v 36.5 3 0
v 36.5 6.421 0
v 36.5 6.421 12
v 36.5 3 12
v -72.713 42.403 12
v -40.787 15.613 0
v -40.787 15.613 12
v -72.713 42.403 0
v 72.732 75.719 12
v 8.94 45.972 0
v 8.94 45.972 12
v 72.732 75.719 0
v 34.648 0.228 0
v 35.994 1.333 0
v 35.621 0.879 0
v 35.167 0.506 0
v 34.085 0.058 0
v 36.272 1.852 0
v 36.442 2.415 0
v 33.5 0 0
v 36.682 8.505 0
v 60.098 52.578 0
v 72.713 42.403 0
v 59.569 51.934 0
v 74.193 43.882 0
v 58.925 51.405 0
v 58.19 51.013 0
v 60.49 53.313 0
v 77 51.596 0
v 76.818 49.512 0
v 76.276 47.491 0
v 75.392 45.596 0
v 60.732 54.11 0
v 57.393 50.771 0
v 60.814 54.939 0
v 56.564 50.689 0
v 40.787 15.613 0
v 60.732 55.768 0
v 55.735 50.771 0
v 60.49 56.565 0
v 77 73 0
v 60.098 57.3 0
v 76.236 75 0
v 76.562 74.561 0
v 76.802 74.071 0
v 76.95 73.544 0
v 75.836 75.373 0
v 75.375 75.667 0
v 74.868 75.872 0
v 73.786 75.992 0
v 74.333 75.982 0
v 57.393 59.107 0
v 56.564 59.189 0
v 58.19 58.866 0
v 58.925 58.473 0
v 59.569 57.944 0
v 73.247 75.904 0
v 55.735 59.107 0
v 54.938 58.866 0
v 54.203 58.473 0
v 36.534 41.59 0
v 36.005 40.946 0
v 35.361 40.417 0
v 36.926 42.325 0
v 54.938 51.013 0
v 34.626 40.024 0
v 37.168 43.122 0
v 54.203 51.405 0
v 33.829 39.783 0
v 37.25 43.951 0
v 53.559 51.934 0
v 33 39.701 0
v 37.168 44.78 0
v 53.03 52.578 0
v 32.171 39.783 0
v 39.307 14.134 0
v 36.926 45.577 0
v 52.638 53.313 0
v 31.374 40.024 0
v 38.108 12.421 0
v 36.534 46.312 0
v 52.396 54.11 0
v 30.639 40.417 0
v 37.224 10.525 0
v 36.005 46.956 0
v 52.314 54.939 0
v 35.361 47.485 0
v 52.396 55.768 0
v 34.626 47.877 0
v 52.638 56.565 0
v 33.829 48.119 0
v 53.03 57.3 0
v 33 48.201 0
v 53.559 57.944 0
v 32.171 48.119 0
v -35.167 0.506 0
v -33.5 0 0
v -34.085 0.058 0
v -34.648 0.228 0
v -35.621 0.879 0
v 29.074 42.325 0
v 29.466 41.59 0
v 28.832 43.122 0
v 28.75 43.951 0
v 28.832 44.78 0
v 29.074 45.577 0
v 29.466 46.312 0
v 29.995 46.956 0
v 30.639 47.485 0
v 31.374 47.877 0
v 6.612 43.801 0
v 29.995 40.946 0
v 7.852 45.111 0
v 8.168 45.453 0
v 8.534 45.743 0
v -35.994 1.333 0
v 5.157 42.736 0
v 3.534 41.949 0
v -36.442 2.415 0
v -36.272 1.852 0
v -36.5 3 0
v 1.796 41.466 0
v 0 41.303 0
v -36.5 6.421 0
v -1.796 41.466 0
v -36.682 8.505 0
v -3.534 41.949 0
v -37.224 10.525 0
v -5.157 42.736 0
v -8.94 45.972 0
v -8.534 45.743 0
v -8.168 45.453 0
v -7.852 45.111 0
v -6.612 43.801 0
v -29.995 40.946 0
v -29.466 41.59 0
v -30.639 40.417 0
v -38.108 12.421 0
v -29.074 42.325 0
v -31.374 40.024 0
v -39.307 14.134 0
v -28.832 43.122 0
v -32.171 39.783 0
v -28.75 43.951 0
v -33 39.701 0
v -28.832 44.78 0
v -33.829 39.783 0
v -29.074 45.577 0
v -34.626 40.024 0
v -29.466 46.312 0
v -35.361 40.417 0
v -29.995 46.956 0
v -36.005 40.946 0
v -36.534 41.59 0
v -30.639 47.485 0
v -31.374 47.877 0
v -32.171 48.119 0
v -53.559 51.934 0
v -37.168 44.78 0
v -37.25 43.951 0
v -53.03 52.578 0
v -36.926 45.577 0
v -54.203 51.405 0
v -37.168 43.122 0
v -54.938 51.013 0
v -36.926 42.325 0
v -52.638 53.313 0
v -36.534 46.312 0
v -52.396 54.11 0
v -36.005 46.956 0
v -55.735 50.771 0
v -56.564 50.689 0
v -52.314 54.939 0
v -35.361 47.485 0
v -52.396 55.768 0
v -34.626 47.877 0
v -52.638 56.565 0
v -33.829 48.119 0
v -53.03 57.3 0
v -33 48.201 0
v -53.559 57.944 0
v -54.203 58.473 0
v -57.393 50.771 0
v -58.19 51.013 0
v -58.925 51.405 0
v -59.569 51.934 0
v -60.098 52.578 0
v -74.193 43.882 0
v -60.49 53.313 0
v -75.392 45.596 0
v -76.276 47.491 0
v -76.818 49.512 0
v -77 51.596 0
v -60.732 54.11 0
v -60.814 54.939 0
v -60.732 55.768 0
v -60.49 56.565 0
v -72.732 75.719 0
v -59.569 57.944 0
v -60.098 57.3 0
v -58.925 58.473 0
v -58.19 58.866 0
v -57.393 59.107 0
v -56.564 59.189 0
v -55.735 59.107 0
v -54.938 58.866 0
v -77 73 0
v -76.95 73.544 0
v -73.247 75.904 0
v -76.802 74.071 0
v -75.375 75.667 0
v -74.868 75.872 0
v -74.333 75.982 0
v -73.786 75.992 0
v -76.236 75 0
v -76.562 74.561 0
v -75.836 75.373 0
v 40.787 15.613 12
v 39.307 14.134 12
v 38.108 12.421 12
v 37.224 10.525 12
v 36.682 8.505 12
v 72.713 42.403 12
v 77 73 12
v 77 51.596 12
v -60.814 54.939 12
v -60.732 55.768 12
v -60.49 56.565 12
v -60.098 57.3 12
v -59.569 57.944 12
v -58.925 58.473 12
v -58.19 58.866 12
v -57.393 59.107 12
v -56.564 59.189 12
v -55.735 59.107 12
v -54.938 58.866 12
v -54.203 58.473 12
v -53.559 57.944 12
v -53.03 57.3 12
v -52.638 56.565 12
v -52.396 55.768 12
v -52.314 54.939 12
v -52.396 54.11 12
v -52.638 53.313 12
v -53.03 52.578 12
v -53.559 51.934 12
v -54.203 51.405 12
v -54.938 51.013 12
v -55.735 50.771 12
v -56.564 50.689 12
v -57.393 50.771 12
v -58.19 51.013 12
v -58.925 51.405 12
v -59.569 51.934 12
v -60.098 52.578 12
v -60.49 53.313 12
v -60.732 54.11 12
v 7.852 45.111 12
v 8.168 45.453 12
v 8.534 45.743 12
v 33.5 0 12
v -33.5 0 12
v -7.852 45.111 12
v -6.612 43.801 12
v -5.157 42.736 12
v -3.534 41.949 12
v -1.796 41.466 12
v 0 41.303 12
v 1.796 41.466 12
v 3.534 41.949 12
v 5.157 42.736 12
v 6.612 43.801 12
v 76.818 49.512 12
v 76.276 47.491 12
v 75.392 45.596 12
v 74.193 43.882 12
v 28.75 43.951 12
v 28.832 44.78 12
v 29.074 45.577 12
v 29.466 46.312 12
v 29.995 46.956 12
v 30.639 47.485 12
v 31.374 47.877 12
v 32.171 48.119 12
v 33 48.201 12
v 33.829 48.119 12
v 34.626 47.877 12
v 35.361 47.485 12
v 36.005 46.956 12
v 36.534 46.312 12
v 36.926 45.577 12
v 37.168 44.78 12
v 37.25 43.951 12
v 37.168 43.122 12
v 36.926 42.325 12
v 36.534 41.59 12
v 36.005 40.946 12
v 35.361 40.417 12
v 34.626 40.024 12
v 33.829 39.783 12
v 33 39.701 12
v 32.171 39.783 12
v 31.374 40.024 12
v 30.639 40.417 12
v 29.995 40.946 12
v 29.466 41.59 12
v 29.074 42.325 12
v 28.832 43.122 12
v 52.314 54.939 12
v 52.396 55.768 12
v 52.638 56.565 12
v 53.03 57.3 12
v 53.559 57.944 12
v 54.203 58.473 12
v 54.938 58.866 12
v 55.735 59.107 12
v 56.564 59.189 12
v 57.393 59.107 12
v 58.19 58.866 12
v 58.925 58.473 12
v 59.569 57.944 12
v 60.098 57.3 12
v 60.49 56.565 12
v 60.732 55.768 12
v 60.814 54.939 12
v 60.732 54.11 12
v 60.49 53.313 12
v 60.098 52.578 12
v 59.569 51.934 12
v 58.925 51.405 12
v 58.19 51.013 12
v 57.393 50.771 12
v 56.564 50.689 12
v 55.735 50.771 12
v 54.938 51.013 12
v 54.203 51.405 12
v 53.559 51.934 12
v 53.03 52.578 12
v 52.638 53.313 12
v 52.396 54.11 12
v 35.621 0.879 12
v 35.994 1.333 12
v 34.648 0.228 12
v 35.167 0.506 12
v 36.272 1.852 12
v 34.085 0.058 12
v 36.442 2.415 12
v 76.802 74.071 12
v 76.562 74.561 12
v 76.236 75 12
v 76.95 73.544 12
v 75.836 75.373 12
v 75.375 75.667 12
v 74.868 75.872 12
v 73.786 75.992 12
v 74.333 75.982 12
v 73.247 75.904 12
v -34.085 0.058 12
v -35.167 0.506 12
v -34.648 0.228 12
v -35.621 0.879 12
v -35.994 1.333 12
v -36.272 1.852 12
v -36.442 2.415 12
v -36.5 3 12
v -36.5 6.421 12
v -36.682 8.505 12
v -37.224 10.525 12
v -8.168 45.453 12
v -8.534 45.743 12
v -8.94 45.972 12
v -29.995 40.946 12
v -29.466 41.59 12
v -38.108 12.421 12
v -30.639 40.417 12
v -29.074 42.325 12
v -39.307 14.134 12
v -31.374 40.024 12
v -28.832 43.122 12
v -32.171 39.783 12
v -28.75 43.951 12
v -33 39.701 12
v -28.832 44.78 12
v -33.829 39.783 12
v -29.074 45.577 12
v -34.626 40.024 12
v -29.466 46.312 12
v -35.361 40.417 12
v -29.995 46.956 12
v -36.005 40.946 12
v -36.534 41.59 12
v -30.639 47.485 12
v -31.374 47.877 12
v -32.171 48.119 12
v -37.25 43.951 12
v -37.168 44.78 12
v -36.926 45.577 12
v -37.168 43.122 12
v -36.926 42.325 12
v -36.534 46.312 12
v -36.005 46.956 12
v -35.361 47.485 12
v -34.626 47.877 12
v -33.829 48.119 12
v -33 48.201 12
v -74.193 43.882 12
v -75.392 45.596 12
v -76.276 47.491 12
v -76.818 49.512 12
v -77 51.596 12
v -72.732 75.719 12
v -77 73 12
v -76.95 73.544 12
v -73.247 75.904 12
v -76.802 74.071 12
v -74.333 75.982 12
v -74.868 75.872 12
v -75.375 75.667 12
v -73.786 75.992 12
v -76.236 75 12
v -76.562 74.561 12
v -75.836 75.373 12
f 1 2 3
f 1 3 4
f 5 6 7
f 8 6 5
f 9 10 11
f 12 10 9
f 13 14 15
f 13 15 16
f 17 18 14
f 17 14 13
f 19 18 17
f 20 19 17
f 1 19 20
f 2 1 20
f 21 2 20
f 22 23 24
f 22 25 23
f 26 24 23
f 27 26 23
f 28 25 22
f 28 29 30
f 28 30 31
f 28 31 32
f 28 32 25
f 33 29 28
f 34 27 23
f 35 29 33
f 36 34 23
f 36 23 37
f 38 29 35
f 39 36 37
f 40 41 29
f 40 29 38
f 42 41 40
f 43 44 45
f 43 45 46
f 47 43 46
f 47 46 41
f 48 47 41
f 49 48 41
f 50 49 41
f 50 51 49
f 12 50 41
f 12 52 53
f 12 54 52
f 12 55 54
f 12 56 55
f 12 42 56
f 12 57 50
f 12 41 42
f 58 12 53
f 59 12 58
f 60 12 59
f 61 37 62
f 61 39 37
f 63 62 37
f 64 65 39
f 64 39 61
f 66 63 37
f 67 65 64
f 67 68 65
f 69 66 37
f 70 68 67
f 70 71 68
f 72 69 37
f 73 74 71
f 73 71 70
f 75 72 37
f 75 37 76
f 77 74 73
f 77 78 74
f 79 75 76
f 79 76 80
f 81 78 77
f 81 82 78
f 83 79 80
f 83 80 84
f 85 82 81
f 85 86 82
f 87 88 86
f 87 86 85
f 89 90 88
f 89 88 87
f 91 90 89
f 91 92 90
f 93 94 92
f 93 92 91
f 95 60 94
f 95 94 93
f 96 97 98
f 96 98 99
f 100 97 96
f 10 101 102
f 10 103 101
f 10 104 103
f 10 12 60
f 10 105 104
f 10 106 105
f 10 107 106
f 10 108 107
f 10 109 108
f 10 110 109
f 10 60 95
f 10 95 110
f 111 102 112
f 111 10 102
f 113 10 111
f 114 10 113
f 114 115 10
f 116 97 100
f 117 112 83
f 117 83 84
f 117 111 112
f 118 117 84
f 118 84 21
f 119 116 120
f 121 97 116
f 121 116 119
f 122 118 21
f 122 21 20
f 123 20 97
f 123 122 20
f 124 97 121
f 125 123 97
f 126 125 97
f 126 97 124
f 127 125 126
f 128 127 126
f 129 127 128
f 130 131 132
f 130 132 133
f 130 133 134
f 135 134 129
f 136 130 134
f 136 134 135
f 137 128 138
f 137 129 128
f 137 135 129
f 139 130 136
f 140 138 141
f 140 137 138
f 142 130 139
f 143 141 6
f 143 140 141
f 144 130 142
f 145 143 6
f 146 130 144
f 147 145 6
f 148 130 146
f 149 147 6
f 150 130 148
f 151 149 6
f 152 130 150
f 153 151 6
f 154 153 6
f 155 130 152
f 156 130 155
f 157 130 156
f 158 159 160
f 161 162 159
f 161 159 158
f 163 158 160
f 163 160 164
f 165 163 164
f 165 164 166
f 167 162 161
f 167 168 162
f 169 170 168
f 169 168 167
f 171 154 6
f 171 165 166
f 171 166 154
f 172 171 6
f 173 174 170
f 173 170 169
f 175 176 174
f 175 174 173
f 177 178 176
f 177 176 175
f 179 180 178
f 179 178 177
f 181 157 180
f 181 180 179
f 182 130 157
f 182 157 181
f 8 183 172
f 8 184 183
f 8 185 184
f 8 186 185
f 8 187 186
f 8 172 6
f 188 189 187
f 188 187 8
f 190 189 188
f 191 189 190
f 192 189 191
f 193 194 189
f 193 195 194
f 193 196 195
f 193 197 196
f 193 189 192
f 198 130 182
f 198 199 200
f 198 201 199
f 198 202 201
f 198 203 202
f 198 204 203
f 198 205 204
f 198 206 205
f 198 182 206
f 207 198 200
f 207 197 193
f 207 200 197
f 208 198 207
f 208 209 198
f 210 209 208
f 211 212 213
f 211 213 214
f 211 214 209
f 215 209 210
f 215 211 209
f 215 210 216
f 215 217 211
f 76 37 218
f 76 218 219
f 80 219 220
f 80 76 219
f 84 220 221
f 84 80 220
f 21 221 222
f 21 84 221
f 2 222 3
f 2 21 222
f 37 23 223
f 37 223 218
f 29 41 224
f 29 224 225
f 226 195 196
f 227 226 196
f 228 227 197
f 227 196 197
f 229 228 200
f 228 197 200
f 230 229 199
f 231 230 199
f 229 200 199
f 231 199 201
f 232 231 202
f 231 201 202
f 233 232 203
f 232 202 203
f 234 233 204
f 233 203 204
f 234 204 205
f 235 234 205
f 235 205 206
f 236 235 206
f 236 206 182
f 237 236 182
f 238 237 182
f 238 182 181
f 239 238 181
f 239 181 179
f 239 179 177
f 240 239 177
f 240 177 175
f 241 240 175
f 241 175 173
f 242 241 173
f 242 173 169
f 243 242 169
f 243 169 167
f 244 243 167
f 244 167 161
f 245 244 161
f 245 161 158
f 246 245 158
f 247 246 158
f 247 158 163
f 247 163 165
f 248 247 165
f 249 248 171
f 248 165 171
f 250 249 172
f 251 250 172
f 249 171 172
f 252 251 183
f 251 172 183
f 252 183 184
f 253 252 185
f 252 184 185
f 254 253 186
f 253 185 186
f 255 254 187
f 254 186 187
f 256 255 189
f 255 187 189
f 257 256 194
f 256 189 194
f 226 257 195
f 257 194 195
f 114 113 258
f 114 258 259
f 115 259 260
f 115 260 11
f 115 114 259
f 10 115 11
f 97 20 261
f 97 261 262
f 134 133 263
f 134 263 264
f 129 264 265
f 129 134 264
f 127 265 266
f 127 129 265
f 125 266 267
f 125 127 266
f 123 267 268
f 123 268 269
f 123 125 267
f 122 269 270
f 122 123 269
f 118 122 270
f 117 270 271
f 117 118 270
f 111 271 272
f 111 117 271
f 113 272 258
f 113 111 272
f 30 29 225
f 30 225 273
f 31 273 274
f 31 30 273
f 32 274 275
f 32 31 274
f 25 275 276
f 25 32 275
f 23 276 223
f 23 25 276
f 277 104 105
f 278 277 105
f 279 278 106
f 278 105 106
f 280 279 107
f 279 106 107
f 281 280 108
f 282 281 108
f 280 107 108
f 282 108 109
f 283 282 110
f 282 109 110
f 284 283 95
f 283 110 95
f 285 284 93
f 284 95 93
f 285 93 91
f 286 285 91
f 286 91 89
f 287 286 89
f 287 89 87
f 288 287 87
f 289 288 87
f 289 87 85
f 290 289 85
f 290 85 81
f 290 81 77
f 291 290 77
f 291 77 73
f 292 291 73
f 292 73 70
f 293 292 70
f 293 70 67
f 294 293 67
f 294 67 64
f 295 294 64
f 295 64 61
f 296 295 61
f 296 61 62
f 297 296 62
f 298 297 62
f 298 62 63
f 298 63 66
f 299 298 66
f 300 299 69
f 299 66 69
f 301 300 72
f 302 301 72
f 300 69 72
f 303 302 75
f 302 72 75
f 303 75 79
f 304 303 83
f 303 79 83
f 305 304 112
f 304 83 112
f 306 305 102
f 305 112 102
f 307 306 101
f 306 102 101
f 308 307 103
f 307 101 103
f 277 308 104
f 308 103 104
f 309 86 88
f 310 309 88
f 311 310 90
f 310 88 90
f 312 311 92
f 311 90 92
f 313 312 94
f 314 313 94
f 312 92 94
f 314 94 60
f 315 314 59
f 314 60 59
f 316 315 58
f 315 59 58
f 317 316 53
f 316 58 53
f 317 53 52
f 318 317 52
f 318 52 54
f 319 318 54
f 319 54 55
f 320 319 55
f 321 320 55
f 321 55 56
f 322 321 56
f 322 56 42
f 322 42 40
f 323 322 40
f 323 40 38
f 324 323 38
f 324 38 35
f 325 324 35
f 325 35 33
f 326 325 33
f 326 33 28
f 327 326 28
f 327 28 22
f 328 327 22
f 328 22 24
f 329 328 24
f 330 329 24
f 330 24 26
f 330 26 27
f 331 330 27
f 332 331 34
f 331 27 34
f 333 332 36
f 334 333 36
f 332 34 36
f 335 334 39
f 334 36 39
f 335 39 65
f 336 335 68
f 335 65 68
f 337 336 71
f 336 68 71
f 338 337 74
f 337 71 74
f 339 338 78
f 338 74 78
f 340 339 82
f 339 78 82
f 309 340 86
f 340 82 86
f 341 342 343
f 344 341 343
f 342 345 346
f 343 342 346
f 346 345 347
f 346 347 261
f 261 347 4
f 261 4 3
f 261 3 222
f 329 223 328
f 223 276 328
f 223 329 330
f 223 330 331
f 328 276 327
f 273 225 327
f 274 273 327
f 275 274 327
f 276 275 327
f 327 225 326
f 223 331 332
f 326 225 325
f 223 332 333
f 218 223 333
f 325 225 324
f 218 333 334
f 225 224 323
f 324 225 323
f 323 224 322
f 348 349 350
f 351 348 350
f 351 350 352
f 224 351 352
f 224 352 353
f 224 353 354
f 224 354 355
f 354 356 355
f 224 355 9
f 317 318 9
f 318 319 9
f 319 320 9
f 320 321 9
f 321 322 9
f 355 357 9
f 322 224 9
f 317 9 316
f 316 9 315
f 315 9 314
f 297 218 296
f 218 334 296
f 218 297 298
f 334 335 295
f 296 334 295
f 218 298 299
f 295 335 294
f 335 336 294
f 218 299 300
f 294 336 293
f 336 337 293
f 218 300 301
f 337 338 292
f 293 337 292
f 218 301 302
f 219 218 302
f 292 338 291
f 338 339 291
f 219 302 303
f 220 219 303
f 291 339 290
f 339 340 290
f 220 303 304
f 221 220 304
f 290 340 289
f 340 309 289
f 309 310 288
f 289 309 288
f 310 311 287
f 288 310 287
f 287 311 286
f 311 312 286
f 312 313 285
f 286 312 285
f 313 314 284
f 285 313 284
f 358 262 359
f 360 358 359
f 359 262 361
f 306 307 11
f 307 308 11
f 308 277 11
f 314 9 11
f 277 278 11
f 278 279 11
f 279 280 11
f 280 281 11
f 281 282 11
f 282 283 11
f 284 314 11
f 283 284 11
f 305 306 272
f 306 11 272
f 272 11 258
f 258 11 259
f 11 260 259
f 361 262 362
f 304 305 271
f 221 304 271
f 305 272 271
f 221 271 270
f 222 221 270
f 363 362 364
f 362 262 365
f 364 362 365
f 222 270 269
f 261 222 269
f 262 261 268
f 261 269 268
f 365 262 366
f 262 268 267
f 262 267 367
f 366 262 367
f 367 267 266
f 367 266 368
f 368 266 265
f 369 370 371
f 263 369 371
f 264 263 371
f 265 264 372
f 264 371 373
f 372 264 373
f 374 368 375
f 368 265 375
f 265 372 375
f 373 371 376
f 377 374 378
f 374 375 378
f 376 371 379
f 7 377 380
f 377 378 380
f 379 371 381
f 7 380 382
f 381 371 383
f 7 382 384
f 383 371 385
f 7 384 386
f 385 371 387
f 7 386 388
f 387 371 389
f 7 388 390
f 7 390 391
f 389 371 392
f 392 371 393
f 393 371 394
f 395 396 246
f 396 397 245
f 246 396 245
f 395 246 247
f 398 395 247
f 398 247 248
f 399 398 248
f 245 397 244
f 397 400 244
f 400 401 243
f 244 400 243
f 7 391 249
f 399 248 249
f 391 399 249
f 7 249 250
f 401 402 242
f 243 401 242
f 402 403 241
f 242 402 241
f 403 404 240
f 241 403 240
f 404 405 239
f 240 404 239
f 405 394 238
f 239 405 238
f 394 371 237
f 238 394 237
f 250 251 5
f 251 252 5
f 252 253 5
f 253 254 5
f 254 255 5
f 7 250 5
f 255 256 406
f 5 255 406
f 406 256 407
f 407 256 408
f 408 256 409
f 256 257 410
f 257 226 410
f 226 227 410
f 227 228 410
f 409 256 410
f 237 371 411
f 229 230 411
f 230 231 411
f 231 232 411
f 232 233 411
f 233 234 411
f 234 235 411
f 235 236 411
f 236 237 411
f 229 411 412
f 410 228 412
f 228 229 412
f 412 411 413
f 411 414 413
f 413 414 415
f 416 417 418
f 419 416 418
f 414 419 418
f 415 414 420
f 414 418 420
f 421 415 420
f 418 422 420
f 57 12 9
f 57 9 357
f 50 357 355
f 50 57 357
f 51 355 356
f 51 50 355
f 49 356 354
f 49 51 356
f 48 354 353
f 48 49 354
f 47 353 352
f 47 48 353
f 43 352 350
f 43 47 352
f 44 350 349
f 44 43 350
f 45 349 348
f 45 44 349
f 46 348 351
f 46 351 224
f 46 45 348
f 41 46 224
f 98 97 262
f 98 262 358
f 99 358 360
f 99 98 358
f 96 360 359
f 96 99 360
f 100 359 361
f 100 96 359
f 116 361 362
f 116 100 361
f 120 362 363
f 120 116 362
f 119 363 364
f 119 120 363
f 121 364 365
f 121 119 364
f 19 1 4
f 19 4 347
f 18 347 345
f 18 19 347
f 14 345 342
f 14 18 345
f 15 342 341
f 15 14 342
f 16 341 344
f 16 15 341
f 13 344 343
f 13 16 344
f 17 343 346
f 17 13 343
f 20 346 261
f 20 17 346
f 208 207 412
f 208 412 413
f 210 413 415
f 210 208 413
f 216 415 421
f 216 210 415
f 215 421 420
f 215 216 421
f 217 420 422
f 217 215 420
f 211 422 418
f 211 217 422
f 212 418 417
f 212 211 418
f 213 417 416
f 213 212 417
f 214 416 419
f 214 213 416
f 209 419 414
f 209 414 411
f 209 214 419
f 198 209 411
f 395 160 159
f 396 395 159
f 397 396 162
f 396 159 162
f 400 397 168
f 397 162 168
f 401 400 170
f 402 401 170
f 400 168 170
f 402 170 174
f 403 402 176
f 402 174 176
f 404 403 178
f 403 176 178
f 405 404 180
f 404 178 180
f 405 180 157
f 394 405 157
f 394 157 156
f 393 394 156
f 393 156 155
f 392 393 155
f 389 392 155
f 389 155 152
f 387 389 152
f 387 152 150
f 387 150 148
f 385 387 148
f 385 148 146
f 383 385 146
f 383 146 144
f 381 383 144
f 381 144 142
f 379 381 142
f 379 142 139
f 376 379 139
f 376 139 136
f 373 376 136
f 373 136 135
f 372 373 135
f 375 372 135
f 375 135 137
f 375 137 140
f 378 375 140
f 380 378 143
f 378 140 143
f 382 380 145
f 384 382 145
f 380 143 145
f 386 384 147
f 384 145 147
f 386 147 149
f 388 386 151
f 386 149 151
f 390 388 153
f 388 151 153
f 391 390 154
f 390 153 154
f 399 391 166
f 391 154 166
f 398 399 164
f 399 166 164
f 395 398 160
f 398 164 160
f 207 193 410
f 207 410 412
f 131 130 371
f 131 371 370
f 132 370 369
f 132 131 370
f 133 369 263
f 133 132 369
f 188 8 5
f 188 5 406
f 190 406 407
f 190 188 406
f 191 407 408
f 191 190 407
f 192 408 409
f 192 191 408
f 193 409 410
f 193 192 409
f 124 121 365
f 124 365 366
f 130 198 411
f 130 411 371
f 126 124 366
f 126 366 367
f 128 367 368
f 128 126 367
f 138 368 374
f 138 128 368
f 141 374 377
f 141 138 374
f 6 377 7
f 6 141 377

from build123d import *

# Parameters (mm, degrees)
EXTRUDE1_DEPTH         = 12
M10_GEVINDHULLER_D     = 8.5
M10_GEVINDHULLER_DEPTH = 22
M10_GEVINDHULLER_TIP   = 2.553657631


with BuildPart() as part:
    # Sketch1 → Extrude1 (new body)
    with BuildSketch(Plane.XY):
        with BuildLine():
            Line((36.5, 6.420773039), (36.5, 3))
            ThreePointArc((36.5, 3), (35.621320344, 0.878679656), (33.5, 0))
            Line((33.5, 0), (0, 0))
            Line((0, 0), (-33.5, 0))
            ThreePointArc((-33.5, 0), (-35.621320344, 0.878679656), (-36.5, 3))
            Line((-36.5, 3), (-36.5, 6.420773039))
            ThreePointArc((-36.5, 6.420773039), (-37.624306556, 11.49219218), (-40.786548684, 15.613306357))
            Line((-40.786548684, 15.613306357), (-72.713451316, 42.40315858))
            ThreePointArc((-72.713451316, 42.40315858), (-75.875693444, 46.524272757), (-77, 51.595691898))
            Line((-77, 51.595691898), (-77, 73))
            ThreePointArc((-77, 73), (-75.611898825, 75.530174337), (-72.732145215, 75.718923361))
            Line((-72.732145215, 75.718923361), (-8.939617358, 45.971979088))
            ThreePointArc((-8.939617358, 45.971979088), (-8.345295598, 45.605139594), (-7.851901649, 45.110819879))
            ThreePointArc((-7.851901649, 45.110819879), (0, 41.303367053), (7.851901649, 45.110819879))
            ThreePointArc((7.851901649, 45.110819879), (8.345295598, 45.605139594), (8.939617358, 45.971979088))
            Line((8.939617358, 45.971979088), (72.732145215, 75.718923361))
            ThreePointArc((72.732145215, 75.718923361), (75.611898825, 75.530174337), (77, 73))
            Line((77, 73), (77, 51.595691898))
            ThreePointArc((77, 51.595691898), (75.875693444, 46.524272757), (72.713451316, 42.40315858))
            Line((72.713451316, 42.40315858), (40.786548684, 15.613306357))
            ThreePointArc((40.786548684, 15.613306357), (37.624306556, 11.49219218), (36.5, 6.420773039))
        make_face()
    extrude(amount=EXTRUDE1_DEPTH)

    # M10 gevindhuller
    with Locations(Plane.XY.offset(12)):
        with Locations((-33, 43.950984745), (-56.564002463, 54.93905955), (56.564002463, 54.93905955), (33, 43.950984745)):
            Hole(M10_GEVINDHULLER_D / 2, depth=M10_GEVINDHULLER_DEPTH)
            with Locations((0, 0, -(M10_GEVINDHULLER_DEPTH + M10_GEVINDHULLER_TIP / 2))):  # 118° drill point
                Cone(0, M10_GEVINDHULLER_D / 2, M10_GEVINDHULLER_TIP, mode=Mode.SUBTRACT)


solid = part.part
